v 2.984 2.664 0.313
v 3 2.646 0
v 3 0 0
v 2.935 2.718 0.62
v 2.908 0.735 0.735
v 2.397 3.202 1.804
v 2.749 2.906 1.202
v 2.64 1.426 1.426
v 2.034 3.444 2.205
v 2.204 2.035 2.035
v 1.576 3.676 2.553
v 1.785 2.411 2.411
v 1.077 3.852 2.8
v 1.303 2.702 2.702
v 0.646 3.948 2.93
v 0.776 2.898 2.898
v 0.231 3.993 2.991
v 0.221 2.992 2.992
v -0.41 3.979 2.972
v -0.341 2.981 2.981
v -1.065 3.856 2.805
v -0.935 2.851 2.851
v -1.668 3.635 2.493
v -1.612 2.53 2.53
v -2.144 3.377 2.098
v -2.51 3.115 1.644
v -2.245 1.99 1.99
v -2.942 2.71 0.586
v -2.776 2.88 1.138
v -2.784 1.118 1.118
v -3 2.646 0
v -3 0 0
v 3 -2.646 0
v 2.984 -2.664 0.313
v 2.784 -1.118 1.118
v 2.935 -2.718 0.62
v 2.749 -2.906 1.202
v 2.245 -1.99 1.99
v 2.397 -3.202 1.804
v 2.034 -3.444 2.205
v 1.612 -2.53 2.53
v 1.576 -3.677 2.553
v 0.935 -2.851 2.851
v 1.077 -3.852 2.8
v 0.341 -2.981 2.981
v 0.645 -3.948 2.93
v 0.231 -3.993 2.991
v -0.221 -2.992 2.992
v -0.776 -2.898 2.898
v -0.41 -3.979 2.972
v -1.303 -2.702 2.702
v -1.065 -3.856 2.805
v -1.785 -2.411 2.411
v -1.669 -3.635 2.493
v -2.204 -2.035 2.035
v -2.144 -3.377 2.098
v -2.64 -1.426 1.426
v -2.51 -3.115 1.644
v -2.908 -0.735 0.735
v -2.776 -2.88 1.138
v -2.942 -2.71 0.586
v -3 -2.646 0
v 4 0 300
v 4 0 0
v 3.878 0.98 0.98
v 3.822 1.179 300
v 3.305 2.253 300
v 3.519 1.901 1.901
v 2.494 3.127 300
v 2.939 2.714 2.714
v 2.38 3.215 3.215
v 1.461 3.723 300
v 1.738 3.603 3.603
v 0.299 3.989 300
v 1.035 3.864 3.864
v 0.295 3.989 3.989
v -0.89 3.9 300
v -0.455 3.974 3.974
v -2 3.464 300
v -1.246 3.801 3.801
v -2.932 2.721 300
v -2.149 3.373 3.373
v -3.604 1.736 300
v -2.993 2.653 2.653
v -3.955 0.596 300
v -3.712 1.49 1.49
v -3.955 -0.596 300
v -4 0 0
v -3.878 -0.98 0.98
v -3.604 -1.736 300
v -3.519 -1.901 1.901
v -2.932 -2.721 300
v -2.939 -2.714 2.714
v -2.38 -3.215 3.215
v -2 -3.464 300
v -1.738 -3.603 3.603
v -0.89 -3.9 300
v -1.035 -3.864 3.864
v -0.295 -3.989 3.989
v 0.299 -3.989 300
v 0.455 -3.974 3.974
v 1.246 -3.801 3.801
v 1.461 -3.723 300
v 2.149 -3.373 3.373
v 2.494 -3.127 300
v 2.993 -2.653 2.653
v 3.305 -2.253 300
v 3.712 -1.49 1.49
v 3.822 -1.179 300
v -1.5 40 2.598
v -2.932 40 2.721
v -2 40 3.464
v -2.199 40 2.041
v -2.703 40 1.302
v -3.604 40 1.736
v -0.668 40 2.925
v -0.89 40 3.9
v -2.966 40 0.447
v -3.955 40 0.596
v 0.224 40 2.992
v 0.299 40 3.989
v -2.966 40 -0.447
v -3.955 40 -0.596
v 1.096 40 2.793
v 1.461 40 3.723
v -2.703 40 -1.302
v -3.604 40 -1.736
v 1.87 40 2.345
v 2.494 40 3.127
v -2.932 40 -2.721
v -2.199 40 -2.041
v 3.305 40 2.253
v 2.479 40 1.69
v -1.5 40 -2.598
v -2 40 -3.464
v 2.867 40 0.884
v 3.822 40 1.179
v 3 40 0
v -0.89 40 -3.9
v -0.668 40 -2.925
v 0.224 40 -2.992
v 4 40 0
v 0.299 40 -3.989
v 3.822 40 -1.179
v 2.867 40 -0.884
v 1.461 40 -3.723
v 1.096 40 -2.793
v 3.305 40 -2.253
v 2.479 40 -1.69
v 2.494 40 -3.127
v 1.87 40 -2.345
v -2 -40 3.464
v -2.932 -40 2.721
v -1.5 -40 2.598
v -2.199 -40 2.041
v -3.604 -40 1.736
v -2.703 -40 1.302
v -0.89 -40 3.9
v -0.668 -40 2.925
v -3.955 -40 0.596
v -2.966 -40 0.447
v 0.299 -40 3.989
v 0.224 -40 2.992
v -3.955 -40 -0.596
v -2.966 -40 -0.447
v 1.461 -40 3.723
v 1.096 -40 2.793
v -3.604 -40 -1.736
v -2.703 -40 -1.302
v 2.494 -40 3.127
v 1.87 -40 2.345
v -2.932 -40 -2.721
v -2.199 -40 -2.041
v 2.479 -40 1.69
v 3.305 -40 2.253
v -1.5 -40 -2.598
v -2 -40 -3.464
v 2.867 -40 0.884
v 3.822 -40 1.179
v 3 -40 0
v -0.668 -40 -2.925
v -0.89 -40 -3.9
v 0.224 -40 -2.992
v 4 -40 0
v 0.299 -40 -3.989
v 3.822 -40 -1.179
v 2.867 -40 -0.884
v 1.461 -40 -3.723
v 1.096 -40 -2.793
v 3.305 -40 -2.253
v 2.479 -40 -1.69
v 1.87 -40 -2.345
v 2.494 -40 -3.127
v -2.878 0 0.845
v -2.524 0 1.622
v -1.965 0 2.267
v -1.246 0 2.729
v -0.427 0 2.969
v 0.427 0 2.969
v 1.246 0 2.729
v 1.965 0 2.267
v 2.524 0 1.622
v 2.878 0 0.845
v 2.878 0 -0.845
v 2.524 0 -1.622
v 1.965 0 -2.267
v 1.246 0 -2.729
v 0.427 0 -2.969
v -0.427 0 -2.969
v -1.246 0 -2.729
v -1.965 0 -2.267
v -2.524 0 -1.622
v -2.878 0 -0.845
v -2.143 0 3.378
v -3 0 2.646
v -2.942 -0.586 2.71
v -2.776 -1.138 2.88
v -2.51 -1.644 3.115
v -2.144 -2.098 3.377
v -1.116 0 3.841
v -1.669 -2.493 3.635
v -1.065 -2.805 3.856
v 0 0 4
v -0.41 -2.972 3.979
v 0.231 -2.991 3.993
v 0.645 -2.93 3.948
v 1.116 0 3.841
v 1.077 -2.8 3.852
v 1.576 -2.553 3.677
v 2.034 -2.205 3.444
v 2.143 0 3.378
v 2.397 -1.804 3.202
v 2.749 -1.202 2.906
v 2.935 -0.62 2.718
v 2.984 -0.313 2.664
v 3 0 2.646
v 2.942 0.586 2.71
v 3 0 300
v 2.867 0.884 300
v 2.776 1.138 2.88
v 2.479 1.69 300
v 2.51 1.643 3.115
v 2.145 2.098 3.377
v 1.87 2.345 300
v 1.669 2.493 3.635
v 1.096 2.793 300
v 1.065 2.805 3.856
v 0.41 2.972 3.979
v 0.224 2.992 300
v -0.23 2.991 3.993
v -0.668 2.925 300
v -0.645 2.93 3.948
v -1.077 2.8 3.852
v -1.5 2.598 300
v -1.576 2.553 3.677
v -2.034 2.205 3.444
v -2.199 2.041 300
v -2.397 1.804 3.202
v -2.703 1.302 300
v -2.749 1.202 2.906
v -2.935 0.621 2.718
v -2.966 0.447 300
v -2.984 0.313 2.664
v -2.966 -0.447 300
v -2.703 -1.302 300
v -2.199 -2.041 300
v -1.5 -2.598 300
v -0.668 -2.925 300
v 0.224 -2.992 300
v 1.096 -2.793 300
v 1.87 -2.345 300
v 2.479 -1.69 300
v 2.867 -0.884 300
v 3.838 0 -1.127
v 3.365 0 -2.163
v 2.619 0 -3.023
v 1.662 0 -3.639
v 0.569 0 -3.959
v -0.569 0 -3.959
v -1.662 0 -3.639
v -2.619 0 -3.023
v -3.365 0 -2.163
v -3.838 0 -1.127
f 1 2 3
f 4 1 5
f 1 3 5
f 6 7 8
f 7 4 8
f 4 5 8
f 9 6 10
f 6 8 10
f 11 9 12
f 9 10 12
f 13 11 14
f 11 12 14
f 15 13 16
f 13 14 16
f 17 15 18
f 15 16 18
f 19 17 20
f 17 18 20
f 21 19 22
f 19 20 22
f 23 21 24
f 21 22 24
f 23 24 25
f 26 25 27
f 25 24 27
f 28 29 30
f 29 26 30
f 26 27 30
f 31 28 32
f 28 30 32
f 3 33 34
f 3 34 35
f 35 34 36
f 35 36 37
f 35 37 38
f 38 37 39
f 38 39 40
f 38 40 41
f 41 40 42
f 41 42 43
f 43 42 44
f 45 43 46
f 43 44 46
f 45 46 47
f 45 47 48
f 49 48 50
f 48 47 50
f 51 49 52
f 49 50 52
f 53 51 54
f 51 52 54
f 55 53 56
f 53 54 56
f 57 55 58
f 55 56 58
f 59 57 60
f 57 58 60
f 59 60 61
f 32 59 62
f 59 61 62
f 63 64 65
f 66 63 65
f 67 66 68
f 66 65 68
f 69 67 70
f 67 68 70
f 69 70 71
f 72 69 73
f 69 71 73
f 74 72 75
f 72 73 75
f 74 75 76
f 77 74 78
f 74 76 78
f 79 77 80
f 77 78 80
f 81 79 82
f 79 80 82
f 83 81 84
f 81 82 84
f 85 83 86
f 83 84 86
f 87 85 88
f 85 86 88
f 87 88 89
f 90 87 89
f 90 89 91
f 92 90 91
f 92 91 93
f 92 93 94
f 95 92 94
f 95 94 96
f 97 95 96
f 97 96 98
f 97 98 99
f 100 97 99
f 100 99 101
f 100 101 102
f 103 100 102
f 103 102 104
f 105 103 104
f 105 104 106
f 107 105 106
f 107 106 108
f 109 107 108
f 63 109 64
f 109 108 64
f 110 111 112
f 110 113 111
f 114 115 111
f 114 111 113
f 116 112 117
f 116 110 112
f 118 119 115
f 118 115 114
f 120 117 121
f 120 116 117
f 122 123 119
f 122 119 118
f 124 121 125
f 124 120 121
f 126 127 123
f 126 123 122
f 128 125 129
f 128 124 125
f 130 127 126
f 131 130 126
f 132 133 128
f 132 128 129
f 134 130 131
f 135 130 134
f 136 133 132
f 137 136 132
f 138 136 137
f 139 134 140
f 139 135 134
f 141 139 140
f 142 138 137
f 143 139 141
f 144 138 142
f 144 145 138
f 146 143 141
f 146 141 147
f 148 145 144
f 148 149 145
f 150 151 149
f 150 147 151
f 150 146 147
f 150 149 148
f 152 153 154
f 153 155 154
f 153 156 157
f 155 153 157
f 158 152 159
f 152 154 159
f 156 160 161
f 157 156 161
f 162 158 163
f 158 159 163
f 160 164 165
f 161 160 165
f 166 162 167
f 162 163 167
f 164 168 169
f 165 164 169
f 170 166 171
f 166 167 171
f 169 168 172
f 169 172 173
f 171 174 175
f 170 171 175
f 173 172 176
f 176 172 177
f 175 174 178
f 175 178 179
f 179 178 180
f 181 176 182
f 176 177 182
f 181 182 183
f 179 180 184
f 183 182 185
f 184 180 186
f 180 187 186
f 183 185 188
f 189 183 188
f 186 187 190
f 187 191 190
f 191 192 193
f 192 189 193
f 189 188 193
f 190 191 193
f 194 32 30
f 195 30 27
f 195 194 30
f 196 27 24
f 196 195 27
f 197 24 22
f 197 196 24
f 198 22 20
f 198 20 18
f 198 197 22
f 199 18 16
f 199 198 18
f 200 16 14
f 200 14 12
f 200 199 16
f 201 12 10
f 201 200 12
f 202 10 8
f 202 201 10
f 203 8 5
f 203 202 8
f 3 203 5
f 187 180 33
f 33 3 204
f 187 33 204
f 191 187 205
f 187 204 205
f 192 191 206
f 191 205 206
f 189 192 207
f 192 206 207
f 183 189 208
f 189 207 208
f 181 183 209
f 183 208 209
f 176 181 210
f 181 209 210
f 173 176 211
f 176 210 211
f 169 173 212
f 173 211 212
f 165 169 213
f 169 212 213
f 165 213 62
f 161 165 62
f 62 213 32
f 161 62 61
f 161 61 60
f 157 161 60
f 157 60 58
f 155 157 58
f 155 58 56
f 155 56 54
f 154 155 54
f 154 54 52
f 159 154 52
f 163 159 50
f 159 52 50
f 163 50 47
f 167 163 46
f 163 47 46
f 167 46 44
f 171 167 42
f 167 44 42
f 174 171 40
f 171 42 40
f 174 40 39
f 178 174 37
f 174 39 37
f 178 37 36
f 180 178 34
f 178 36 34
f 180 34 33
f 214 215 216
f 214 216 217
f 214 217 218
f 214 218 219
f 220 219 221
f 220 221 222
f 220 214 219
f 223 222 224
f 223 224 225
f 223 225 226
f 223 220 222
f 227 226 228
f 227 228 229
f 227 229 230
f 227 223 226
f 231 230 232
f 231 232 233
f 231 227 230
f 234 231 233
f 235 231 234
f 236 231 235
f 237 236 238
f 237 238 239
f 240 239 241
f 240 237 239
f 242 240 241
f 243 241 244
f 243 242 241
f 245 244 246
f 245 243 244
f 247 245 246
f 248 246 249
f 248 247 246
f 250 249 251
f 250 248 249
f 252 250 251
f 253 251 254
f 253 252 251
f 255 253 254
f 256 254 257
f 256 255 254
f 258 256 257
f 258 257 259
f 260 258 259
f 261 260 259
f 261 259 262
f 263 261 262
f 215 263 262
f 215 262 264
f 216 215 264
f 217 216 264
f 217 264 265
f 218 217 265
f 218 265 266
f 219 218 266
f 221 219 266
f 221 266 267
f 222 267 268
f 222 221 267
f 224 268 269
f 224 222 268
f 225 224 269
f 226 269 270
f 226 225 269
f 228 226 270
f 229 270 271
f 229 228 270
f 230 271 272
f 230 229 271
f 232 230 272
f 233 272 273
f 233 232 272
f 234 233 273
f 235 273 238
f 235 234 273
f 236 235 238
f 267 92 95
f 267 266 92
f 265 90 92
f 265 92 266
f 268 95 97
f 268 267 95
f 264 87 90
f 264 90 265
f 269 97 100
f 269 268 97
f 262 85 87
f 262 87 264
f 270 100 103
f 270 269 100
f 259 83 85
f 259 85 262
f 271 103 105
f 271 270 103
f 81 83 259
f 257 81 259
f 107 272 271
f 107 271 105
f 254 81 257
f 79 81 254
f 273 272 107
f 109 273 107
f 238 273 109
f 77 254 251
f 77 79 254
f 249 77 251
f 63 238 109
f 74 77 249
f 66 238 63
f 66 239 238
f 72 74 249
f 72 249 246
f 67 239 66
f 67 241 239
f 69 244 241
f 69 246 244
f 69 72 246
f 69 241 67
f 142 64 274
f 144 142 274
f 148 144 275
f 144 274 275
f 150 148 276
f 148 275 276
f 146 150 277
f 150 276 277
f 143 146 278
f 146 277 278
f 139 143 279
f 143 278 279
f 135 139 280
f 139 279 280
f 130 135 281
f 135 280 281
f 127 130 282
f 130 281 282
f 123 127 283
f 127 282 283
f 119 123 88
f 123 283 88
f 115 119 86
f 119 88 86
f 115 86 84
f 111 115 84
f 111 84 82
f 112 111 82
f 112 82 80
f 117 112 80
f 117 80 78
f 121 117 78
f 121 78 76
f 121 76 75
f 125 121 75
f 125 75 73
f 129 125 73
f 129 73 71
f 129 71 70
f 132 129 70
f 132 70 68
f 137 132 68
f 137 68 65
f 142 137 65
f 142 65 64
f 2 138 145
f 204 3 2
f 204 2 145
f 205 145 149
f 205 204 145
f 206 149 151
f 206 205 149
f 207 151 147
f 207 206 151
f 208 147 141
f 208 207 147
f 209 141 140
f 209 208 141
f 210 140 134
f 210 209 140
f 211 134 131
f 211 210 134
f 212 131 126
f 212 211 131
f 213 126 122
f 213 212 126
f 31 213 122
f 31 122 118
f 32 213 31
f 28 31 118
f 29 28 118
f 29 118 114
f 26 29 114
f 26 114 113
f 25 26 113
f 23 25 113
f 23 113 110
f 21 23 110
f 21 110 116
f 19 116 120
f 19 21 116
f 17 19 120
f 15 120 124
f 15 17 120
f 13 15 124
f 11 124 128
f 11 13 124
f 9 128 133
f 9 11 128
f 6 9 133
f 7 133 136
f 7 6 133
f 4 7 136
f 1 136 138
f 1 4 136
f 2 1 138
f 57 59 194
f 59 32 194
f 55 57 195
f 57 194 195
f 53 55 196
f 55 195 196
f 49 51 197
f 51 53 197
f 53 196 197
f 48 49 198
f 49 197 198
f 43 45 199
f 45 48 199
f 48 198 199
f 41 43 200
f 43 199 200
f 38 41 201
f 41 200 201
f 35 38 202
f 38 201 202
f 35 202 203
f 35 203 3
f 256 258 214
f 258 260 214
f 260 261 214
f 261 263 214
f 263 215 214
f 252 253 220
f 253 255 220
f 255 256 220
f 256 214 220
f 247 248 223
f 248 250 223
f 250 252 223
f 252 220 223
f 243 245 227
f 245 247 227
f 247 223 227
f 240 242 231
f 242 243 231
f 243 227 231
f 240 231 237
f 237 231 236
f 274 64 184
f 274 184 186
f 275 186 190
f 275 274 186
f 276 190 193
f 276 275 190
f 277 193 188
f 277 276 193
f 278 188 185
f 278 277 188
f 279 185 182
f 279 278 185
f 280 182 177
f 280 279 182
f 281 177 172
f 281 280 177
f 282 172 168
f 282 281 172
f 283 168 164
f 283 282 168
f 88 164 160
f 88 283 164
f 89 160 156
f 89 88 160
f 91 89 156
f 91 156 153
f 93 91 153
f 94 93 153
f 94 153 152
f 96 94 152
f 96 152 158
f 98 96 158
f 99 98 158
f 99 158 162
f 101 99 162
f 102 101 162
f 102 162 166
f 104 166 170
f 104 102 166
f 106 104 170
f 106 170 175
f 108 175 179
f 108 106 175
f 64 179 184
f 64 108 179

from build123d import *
from build123d.topology import SkipClean

# Parameters (mm, degrees)
SKETCH3_R                = 4
SKETCH3_R_2              = 3
BOSS_EXTRUDE1_DEPTH      = 300
BOSS_EXTRUDE3_DEPTH      = 40
BOSS_EXTRUDE3_DEPTH_BACK = 40
SKETCH6_R                = 4
SKETCH6_R_2              = 3
CUT_EXTRUDE1_DEPTH       = 311.509259244
CUT_EXTRUDE1_DEPTH_BACK  = 311.509259244
SKETCH7_R                = 3


with BuildPart() as part:
    # Sketch3 → Boss-Extrude1 (new body)
    with BuildSketch(Plane.XY):
        Circle(SKETCH3_R)
        Circle(SKETCH3_R_2, mode=Mode.SUBTRACT)
    extrude(amount=BOSS_EXTRUDE1_DEPTH)

    # Sketch6 → Boss-Extrude3 (add, two sides: drawn at the far end of the back side and taken through both)
    with BuildSketch(Plane(origin=(0, 0, 0), x_dir=(1, 0, 0), z_dir=(0, 1, 0)).offset(-BOSS_EXTRUDE3_DEPTH_BACK)):
        Circle(SKETCH6_R)
        Circle(SKETCH6_R_2, mode=Mode.SUBTRACT)
    extrude(amount=BOSS_EXTRUDE3_DEPTH + BOSS_EXTRUDE3_DEPTH_BACK)

    # Sketch7 → Cut-Extrude1 (cut, two sides: drawn at the far end of the back side and taken through both)
    with SkipClean():  # the faces are left unmerged after this step: merging them gives an invalid solid
        with BuildSketch(Plane.XZ.offset(40).offset(-CUT_EXTRUDE1_DEPTH_BACK)):
            Circle(SKETCH7_R)
        extrude(amount=CUT_EXTRUDE1_DEPTH + CUT_EXTRUDE1_DEPTH_BACK, mode=Mode.SUBTRACT)


solid = part.part
